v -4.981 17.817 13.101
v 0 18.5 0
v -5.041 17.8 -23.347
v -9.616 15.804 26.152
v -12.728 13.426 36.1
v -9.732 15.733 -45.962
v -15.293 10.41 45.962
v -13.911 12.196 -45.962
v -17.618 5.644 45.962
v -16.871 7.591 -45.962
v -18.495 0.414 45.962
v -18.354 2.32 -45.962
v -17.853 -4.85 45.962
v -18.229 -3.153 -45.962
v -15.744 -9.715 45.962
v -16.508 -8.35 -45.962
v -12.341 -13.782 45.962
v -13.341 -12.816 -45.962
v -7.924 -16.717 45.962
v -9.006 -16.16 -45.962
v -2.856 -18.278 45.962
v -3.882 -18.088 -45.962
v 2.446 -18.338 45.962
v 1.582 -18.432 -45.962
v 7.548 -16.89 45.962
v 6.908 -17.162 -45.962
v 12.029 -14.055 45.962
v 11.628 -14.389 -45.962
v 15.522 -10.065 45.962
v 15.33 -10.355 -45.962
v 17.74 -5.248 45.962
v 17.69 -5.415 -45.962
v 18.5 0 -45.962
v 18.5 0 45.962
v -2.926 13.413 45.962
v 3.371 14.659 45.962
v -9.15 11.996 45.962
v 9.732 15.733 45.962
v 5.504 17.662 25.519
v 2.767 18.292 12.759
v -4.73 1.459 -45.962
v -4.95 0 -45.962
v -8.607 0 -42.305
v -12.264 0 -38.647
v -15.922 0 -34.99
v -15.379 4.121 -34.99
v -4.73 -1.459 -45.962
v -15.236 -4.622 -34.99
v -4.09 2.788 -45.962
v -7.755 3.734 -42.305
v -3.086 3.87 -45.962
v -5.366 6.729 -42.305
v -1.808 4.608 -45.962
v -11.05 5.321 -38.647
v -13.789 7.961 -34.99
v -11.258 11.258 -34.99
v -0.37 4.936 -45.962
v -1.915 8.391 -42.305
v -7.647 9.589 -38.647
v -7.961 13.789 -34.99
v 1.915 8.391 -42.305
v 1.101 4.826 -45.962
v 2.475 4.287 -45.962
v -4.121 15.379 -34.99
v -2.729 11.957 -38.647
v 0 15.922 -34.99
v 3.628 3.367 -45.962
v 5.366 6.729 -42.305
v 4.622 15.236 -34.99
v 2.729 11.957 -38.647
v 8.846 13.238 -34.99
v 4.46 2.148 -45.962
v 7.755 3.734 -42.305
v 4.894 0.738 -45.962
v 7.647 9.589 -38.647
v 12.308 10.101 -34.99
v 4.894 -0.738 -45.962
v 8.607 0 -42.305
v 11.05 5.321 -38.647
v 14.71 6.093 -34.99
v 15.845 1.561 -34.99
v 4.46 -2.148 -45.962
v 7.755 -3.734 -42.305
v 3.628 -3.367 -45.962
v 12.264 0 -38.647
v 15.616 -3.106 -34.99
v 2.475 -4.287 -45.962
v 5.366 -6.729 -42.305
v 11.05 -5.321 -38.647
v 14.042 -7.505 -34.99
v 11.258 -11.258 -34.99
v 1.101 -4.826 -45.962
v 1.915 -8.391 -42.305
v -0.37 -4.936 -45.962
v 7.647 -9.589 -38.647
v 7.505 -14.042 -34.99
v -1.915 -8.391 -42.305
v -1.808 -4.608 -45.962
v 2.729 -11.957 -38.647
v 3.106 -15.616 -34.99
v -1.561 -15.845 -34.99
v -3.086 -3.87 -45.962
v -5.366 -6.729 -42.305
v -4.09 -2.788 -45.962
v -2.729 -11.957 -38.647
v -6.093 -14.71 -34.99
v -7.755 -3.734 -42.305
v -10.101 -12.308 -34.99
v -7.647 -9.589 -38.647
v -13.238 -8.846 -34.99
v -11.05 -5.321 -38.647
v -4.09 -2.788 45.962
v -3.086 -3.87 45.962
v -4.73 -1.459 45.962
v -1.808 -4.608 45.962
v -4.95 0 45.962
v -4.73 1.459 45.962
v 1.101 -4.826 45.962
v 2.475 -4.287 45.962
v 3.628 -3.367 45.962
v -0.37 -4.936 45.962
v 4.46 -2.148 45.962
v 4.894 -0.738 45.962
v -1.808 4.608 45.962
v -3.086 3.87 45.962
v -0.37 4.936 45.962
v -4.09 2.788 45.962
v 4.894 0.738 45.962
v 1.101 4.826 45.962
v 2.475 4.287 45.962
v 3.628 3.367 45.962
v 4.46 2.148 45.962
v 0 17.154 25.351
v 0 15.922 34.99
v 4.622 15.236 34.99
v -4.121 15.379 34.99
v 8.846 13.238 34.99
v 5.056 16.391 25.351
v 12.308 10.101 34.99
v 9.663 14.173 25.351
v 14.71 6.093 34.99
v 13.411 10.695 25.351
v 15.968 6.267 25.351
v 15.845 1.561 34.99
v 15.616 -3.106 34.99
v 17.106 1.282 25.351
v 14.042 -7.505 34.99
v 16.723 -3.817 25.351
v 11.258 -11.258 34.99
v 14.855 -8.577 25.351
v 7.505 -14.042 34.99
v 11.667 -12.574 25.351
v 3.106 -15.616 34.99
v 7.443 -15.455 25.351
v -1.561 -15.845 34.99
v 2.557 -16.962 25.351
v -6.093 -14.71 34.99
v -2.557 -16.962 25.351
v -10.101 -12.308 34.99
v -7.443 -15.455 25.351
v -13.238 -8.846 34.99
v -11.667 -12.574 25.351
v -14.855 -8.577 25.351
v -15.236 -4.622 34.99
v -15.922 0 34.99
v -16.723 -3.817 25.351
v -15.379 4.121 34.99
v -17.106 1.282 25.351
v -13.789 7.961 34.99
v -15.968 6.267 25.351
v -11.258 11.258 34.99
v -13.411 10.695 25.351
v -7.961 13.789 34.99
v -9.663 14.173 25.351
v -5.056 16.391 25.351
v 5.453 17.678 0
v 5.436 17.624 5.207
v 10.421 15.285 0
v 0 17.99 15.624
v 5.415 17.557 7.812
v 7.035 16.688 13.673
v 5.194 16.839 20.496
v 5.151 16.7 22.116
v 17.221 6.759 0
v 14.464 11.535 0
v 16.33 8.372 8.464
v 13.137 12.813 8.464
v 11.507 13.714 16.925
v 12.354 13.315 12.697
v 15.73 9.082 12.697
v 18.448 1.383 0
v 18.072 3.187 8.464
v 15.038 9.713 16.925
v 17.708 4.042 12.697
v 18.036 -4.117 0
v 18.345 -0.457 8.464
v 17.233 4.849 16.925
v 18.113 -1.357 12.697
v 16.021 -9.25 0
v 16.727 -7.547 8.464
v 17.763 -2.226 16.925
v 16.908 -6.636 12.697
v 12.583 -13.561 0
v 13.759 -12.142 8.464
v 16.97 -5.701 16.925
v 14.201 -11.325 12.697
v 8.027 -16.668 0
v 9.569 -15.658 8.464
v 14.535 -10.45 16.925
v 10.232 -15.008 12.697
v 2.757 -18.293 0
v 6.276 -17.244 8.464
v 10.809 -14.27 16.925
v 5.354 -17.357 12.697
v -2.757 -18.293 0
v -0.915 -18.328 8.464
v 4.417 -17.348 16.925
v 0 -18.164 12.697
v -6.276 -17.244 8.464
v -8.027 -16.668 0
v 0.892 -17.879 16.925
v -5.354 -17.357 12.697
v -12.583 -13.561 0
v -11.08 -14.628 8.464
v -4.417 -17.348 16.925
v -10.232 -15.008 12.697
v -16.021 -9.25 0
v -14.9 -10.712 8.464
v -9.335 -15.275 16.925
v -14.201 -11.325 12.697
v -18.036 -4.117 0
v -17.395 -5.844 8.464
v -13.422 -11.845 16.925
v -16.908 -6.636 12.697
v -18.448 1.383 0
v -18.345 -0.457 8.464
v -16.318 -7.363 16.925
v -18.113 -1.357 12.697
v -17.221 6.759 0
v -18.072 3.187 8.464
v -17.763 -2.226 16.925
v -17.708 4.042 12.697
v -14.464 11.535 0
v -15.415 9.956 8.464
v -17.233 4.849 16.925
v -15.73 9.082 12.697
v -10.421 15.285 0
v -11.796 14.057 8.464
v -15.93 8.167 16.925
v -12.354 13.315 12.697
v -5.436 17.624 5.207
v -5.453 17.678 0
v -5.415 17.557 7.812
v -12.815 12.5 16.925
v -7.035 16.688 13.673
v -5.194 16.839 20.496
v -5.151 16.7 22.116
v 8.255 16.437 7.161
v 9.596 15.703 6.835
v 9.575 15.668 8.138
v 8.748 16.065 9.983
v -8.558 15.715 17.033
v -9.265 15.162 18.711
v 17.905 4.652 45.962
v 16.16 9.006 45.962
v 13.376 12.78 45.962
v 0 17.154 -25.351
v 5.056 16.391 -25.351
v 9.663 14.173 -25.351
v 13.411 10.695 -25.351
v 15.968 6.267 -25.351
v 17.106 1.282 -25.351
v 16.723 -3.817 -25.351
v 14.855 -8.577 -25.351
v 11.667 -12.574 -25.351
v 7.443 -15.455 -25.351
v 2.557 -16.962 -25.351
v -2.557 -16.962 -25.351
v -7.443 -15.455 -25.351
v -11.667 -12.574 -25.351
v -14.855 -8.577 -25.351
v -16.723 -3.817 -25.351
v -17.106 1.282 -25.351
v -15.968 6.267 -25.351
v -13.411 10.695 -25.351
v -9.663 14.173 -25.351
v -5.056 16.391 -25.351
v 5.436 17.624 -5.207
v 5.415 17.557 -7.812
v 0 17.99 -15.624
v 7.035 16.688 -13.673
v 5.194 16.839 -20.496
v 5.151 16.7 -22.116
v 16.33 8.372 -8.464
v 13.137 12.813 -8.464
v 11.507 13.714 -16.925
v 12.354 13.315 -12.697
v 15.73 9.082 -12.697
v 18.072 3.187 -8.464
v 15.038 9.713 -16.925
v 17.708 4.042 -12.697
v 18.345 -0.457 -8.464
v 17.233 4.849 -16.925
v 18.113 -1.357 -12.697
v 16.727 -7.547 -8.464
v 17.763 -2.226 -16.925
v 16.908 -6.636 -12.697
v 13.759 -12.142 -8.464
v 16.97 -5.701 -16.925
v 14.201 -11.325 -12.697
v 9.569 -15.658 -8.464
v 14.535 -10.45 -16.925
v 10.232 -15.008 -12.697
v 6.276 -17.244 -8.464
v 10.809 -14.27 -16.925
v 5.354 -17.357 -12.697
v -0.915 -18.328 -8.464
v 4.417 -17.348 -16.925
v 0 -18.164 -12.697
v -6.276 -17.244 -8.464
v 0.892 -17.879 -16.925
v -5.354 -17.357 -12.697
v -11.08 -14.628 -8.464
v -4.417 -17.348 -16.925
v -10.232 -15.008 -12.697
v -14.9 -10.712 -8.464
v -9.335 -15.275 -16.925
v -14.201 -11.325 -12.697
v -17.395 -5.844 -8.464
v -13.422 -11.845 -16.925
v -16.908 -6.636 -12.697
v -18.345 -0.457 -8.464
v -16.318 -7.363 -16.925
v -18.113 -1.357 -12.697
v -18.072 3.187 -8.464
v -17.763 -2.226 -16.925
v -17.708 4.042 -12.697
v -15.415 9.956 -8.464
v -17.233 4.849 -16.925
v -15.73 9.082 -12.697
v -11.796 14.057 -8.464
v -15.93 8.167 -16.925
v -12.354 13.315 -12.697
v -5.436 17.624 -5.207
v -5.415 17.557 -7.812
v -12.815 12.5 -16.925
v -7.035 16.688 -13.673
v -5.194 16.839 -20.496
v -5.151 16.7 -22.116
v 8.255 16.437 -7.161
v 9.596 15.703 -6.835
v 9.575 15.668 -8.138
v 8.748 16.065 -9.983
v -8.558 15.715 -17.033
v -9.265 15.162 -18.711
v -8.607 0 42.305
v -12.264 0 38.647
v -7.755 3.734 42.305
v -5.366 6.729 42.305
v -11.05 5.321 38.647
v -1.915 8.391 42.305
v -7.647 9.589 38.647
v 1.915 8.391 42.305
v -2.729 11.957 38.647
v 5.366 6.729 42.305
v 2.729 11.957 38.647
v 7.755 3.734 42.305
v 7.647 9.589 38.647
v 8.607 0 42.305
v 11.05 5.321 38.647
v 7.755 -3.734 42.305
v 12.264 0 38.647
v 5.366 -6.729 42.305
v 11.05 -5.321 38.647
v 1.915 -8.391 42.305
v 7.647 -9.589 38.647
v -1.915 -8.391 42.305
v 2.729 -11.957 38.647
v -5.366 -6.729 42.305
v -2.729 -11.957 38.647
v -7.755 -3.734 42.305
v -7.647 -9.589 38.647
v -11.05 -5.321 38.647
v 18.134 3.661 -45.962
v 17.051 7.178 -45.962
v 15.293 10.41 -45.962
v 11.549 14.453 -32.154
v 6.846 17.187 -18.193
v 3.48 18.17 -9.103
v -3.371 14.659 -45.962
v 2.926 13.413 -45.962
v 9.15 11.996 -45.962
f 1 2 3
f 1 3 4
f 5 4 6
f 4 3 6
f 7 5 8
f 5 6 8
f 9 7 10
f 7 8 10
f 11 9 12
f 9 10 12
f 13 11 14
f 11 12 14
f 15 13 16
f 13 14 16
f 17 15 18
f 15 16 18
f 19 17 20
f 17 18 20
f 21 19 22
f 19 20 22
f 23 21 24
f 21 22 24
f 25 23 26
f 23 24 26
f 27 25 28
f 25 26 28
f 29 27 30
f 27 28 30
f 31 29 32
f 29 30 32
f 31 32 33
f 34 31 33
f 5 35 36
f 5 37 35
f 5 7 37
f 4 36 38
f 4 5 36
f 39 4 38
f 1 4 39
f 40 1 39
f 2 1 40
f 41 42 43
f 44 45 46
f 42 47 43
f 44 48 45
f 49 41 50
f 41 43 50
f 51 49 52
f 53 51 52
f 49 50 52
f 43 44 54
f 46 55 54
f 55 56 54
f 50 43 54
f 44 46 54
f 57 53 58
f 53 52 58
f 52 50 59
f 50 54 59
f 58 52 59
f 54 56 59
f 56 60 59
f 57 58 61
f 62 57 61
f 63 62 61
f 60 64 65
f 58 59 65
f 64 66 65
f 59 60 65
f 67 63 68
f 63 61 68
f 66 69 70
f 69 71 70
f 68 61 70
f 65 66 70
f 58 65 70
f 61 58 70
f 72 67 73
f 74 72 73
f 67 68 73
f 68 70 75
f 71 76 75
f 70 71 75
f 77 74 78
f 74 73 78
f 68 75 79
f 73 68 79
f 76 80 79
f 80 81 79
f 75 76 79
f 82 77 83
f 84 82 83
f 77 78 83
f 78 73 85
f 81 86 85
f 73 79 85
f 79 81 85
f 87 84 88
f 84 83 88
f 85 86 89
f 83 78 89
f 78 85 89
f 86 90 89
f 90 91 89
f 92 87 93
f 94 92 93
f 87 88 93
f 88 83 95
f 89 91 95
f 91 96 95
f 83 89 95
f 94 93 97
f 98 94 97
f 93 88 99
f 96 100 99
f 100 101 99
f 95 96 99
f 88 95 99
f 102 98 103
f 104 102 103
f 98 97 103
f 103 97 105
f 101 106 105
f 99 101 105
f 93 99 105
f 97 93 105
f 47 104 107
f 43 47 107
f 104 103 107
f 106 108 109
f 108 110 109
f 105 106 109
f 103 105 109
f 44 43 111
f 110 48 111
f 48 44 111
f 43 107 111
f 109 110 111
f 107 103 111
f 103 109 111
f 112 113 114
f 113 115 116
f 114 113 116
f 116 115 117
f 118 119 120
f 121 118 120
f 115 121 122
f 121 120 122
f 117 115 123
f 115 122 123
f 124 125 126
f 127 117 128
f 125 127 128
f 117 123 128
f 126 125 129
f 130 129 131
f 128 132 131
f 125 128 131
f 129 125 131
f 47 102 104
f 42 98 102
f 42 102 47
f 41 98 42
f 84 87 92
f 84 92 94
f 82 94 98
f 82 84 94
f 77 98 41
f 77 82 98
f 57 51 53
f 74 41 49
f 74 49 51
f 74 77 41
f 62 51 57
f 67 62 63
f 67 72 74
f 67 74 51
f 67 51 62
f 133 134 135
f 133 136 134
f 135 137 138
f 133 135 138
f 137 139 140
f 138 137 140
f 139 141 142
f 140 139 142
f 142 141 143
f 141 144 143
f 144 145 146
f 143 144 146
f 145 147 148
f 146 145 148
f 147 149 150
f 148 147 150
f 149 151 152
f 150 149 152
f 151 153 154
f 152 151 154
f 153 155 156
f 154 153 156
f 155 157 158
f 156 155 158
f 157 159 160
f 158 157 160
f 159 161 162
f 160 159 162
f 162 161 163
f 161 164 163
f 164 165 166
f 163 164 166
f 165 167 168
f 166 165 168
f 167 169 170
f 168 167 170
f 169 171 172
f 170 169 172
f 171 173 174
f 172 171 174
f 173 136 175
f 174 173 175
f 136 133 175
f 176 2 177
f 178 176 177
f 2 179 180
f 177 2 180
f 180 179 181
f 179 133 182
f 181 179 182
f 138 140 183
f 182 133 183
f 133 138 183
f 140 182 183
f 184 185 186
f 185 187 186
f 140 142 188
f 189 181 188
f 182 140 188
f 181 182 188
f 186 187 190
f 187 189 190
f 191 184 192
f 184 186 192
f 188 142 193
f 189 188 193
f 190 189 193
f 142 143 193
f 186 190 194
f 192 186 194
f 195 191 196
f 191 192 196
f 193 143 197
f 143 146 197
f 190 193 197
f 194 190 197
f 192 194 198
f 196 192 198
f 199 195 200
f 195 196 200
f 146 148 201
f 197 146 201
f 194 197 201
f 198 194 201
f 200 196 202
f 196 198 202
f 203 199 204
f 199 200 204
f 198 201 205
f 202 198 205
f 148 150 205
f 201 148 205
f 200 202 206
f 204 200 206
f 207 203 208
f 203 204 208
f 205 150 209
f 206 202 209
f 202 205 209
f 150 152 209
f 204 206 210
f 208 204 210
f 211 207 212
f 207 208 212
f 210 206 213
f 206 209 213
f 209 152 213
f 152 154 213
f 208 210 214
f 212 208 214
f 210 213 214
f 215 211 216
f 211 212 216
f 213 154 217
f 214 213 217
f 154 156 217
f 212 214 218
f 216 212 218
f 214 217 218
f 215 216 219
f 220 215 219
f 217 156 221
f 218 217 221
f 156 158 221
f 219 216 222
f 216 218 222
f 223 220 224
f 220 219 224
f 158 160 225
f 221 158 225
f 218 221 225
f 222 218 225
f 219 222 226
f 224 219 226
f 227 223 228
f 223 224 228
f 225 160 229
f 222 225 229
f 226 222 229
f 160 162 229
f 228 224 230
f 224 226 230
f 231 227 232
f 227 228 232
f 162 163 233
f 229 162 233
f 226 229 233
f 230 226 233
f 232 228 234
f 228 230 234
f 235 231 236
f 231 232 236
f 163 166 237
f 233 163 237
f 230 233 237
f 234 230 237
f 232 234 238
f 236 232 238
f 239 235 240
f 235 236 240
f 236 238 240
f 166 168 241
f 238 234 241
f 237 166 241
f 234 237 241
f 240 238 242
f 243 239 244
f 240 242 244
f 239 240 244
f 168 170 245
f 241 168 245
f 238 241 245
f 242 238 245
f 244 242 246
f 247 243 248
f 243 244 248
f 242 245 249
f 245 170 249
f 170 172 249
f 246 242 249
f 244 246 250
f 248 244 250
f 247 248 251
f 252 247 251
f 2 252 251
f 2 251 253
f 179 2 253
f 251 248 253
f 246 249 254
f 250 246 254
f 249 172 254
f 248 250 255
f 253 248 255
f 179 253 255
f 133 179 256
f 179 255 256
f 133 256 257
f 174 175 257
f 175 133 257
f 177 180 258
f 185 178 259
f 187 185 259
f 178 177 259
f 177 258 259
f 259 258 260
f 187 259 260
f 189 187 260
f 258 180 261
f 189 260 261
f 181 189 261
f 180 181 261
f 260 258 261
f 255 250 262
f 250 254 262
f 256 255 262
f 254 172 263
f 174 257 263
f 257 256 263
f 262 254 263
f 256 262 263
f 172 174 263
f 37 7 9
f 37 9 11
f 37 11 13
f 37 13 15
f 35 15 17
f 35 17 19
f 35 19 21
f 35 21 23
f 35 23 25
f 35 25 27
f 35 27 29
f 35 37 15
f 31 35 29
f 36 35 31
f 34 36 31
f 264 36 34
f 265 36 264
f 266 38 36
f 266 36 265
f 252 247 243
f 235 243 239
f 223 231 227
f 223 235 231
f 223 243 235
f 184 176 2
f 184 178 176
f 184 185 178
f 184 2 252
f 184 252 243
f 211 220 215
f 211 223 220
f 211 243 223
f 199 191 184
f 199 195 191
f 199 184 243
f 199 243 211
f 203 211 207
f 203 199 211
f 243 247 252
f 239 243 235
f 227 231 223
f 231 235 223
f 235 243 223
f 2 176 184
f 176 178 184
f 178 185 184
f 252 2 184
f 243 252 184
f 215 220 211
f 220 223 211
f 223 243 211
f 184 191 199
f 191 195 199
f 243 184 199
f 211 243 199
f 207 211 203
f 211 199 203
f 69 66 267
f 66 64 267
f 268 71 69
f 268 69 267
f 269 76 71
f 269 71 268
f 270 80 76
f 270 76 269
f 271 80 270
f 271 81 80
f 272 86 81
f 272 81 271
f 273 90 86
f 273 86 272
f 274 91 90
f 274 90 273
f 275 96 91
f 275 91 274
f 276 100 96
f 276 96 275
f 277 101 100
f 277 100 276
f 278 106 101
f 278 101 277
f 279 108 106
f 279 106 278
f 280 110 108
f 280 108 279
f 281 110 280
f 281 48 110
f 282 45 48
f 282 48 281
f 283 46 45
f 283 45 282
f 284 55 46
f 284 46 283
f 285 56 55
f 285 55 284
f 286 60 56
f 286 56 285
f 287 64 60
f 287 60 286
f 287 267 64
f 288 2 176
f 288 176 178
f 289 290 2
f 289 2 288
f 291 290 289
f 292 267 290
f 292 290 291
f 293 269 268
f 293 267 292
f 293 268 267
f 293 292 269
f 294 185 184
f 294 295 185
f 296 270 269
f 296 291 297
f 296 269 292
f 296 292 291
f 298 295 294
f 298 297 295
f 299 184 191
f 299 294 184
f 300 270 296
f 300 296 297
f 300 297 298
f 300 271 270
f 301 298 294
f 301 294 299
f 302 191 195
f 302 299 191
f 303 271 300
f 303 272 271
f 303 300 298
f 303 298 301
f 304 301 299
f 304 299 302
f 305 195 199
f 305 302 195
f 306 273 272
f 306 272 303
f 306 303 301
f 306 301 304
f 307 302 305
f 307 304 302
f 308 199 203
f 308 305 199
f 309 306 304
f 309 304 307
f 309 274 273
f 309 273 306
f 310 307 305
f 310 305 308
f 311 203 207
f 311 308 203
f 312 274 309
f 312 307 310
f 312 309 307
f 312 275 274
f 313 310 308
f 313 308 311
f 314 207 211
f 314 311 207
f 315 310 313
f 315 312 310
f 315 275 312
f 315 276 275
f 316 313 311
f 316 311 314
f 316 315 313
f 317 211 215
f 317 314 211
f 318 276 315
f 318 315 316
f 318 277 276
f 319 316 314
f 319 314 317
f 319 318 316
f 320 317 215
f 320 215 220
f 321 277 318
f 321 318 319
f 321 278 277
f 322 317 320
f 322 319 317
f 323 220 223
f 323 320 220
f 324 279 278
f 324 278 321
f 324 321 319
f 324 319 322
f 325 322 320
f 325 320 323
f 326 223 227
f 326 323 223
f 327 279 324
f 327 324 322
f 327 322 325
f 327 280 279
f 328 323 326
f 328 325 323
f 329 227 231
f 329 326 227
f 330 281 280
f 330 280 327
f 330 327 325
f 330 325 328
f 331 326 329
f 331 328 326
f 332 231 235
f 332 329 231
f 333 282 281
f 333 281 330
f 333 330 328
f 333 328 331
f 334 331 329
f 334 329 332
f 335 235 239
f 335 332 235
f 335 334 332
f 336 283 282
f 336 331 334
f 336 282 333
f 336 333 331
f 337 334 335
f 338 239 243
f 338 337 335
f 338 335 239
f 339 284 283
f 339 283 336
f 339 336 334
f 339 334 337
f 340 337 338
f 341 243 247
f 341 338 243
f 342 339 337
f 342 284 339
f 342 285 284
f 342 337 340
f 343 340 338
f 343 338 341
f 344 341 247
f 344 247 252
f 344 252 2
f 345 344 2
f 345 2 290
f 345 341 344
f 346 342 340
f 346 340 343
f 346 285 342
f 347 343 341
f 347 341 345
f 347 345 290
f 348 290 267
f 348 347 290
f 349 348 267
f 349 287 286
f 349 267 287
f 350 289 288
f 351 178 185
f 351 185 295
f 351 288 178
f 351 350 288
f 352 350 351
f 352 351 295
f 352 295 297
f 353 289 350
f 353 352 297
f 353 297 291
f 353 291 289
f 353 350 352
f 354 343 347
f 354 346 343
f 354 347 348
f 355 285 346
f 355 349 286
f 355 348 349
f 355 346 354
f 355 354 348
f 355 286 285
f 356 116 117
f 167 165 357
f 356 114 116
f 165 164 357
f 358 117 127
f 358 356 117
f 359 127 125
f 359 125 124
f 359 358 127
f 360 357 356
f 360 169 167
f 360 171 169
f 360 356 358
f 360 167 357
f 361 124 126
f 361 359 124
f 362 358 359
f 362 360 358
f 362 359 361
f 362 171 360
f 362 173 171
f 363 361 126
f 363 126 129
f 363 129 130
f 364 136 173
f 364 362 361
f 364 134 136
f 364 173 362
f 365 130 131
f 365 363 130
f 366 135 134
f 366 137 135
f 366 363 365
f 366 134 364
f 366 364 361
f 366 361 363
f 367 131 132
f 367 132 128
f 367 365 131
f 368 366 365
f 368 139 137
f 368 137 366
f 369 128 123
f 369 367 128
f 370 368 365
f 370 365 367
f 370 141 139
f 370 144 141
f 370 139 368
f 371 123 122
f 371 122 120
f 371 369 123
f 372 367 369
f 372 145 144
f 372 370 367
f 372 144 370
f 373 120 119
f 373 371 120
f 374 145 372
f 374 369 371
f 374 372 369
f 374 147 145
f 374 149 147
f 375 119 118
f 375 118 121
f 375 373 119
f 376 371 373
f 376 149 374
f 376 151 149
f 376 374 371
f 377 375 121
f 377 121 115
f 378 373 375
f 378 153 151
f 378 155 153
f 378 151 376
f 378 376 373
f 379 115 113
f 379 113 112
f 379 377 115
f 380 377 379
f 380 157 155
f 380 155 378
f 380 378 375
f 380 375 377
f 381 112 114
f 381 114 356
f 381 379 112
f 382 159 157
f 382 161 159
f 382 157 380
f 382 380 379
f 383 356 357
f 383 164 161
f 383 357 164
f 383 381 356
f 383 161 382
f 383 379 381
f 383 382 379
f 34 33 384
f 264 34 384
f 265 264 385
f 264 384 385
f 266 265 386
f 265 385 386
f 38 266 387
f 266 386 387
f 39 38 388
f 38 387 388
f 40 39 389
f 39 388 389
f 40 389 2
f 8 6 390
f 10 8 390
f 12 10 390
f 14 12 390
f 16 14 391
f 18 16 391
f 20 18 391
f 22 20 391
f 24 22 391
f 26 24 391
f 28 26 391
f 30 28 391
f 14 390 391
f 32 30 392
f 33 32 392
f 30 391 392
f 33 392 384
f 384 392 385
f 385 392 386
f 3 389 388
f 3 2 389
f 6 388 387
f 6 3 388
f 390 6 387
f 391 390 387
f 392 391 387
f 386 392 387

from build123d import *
from OCP.BRepAlgoAPI import BRepAlgoAPI_Cut
from OCP.TopTools import TopTools_ListOfShape

# Parameters (mm, degrees)
EXTRUDE_1_DEPTH      = 45.961941
EXTRUDE_1_DEPTH_BACK = 45.961941
SKETCH_1_R           = 18.5
CUT_EXTRUDE_START    = -55.581475552
CUT_EXTRUDE_1_DEPTH  = 91.162951004


with BuildPart() as part:
    # Эскиз1 → Бобышка-Вытянуть1 (new, two sides: drawn at the far end of the back side and taken through both)
    with BuildSketch(Plane.XY.offset(-EXTRUDE_1_DEPTH_BACK)):
        Circle(SKETCH_1_R)
    extrude(amount=EXTRUDE_1_DEPTH + EXTRUDE_1_DEPTH_BACK)


with BuildPart() as cut_extrude_1_tool:
    # Вырез-Вытянуть1: read off the stored shape, not the designer's step
    # Вырез-Вытянуть1 outline → Вырез-Вытянуть1 (new body)
    with BuildSketch(Plane(origin=(7.071067812, -101.5, 7.071067812), x_dir=(0.7071067811865488, 0, -0.7071067811865464), z_dir=(0.7071067811865464, 0, 0.7071067811865488)).offset(CUT_EXTRUDE_START)):
        with BuildLine():
            ThreePointArc((0, 120), (22.031377282, 117.960240823), (43.313776165, 111.910306917))
            Line((43.313776165, 111.910306917), (45, 111.257670679))
            Line((45, 111.257670679), (45, 122))
            Line((45, 122), (-45, 122))
            Line((-45, 122), (-45, 111.257670679))
            Line((-45, 111.257670679), (-43.313776165, 111.910306917))
            ThreePointArc((-43.313776165, 111.910306917), (-22.031377282, 117.960240823), (0, 120))
        make_face()
    extrude(amount=CUT_EXTRUDE_1_DEPTH)


with BuildPart() as part_1:
    add(part.part)

    # Вырез-Вытянуть1: cut by cut_extrude_1_tool, with a tolerance
    cut_extrude_1_stock = TopTools_ListOfShape()
    cut_extrude_1_stock.Append(part_1.part.wrapped)
    cut_extrude_1_tools = TopTools_ListOfShape()
    cut_extrude_1_tools.Append(cut_extrude_1_tool.part.wrapped)
    cut_extrude_1_cut = BRepAlgoAPI_Cut()
    cut_extrude_1_cut.SetArguments(cut_extrude_1_stock)
    cut_extrude_1_cut.SetTools(cut_extrude_1_tools)
    cut_extrude_1_cut.SetFuzzyValue(0.00001)
    cut_extrude_1_cut.Build()
    add(Compound.cast(cut_extrude_1_cut.Shape()).solids(), mode=Mode.REPLACE)


with BuildPart() as body_2:
    # Эскиз5 → Повернуть1 (revolve)
    with BuildSketch(Plane(origin=(0, 0, 0), x_dir=(0, 0, -1), z_dir=(1, 0, 0))):
        with BuildLine():
            Line((-45.961940777, 14.015150521), (-45.961940777, 0))
            Line((-45.961940777, 0), (0, 0))
            Line((0, 0), (0, 18.5))
            add(Edge.make_bspline(
                [(0, 18.5), (-23.418590613, 18.5), (-45.961940777, 14.015150521)],
                knots=[4.71238898, 4.71238898, 4.71238898, 4.986647594, 4.986647594, 4.986647594], degree=2, weights=[1, 0.990612501, 1]))
        make_face()
    revolve(axis=Axis((0, 0, 1045.961940777), (0, 0, -1)))

    # Эскиз6 → Вырез-Повернуть1 (revolve, cut)
    with BuildSketch(Plane(origin=(0, 0, 0), x_dir=(1, 0, 0), z_dir=(0, 1, 0)), mode=Mode.PRIVATE) as cut_revolve_1_sk:
        with BuildLine():
            Line((4.949747468, -45.961940777), (15.921673633, -34.990014613))
            add(Edge.make_bspline(
                [(14.015150521, -45.961940777), (15.097613594, -40.520878777), (15.921673633, -34.990014613)],
                knots=[1.296537713, 1.296537713, 1.296537713, 1.36312621, 1.36312621, 1.36312621], degree=2, weights=[1, 0.999445798, 1]))
            Line((14.015150521, -45.961940777), (4.949747468, -45.961940777))
        make_face()
    revolve(cut_revolve_1_sk.sketch.rotate(Axis((0, 0, 1000), (0, 0, -1)), 180), axis=Axis((0, 0, 1000), (0, 0, -1)), mode=Mode.SUBTRACT)


with BuildPart() as body_3:
    # Зеркальное отражение1: mirrored copy
    add(body_2.part.mirror(Plane(origin=(0, 18.5, 0), x_dir=(1, 0, 0), z_dir=(0, 0, 1))))


solid = Compound([part_1.part, body_2.part, body_3.part])
